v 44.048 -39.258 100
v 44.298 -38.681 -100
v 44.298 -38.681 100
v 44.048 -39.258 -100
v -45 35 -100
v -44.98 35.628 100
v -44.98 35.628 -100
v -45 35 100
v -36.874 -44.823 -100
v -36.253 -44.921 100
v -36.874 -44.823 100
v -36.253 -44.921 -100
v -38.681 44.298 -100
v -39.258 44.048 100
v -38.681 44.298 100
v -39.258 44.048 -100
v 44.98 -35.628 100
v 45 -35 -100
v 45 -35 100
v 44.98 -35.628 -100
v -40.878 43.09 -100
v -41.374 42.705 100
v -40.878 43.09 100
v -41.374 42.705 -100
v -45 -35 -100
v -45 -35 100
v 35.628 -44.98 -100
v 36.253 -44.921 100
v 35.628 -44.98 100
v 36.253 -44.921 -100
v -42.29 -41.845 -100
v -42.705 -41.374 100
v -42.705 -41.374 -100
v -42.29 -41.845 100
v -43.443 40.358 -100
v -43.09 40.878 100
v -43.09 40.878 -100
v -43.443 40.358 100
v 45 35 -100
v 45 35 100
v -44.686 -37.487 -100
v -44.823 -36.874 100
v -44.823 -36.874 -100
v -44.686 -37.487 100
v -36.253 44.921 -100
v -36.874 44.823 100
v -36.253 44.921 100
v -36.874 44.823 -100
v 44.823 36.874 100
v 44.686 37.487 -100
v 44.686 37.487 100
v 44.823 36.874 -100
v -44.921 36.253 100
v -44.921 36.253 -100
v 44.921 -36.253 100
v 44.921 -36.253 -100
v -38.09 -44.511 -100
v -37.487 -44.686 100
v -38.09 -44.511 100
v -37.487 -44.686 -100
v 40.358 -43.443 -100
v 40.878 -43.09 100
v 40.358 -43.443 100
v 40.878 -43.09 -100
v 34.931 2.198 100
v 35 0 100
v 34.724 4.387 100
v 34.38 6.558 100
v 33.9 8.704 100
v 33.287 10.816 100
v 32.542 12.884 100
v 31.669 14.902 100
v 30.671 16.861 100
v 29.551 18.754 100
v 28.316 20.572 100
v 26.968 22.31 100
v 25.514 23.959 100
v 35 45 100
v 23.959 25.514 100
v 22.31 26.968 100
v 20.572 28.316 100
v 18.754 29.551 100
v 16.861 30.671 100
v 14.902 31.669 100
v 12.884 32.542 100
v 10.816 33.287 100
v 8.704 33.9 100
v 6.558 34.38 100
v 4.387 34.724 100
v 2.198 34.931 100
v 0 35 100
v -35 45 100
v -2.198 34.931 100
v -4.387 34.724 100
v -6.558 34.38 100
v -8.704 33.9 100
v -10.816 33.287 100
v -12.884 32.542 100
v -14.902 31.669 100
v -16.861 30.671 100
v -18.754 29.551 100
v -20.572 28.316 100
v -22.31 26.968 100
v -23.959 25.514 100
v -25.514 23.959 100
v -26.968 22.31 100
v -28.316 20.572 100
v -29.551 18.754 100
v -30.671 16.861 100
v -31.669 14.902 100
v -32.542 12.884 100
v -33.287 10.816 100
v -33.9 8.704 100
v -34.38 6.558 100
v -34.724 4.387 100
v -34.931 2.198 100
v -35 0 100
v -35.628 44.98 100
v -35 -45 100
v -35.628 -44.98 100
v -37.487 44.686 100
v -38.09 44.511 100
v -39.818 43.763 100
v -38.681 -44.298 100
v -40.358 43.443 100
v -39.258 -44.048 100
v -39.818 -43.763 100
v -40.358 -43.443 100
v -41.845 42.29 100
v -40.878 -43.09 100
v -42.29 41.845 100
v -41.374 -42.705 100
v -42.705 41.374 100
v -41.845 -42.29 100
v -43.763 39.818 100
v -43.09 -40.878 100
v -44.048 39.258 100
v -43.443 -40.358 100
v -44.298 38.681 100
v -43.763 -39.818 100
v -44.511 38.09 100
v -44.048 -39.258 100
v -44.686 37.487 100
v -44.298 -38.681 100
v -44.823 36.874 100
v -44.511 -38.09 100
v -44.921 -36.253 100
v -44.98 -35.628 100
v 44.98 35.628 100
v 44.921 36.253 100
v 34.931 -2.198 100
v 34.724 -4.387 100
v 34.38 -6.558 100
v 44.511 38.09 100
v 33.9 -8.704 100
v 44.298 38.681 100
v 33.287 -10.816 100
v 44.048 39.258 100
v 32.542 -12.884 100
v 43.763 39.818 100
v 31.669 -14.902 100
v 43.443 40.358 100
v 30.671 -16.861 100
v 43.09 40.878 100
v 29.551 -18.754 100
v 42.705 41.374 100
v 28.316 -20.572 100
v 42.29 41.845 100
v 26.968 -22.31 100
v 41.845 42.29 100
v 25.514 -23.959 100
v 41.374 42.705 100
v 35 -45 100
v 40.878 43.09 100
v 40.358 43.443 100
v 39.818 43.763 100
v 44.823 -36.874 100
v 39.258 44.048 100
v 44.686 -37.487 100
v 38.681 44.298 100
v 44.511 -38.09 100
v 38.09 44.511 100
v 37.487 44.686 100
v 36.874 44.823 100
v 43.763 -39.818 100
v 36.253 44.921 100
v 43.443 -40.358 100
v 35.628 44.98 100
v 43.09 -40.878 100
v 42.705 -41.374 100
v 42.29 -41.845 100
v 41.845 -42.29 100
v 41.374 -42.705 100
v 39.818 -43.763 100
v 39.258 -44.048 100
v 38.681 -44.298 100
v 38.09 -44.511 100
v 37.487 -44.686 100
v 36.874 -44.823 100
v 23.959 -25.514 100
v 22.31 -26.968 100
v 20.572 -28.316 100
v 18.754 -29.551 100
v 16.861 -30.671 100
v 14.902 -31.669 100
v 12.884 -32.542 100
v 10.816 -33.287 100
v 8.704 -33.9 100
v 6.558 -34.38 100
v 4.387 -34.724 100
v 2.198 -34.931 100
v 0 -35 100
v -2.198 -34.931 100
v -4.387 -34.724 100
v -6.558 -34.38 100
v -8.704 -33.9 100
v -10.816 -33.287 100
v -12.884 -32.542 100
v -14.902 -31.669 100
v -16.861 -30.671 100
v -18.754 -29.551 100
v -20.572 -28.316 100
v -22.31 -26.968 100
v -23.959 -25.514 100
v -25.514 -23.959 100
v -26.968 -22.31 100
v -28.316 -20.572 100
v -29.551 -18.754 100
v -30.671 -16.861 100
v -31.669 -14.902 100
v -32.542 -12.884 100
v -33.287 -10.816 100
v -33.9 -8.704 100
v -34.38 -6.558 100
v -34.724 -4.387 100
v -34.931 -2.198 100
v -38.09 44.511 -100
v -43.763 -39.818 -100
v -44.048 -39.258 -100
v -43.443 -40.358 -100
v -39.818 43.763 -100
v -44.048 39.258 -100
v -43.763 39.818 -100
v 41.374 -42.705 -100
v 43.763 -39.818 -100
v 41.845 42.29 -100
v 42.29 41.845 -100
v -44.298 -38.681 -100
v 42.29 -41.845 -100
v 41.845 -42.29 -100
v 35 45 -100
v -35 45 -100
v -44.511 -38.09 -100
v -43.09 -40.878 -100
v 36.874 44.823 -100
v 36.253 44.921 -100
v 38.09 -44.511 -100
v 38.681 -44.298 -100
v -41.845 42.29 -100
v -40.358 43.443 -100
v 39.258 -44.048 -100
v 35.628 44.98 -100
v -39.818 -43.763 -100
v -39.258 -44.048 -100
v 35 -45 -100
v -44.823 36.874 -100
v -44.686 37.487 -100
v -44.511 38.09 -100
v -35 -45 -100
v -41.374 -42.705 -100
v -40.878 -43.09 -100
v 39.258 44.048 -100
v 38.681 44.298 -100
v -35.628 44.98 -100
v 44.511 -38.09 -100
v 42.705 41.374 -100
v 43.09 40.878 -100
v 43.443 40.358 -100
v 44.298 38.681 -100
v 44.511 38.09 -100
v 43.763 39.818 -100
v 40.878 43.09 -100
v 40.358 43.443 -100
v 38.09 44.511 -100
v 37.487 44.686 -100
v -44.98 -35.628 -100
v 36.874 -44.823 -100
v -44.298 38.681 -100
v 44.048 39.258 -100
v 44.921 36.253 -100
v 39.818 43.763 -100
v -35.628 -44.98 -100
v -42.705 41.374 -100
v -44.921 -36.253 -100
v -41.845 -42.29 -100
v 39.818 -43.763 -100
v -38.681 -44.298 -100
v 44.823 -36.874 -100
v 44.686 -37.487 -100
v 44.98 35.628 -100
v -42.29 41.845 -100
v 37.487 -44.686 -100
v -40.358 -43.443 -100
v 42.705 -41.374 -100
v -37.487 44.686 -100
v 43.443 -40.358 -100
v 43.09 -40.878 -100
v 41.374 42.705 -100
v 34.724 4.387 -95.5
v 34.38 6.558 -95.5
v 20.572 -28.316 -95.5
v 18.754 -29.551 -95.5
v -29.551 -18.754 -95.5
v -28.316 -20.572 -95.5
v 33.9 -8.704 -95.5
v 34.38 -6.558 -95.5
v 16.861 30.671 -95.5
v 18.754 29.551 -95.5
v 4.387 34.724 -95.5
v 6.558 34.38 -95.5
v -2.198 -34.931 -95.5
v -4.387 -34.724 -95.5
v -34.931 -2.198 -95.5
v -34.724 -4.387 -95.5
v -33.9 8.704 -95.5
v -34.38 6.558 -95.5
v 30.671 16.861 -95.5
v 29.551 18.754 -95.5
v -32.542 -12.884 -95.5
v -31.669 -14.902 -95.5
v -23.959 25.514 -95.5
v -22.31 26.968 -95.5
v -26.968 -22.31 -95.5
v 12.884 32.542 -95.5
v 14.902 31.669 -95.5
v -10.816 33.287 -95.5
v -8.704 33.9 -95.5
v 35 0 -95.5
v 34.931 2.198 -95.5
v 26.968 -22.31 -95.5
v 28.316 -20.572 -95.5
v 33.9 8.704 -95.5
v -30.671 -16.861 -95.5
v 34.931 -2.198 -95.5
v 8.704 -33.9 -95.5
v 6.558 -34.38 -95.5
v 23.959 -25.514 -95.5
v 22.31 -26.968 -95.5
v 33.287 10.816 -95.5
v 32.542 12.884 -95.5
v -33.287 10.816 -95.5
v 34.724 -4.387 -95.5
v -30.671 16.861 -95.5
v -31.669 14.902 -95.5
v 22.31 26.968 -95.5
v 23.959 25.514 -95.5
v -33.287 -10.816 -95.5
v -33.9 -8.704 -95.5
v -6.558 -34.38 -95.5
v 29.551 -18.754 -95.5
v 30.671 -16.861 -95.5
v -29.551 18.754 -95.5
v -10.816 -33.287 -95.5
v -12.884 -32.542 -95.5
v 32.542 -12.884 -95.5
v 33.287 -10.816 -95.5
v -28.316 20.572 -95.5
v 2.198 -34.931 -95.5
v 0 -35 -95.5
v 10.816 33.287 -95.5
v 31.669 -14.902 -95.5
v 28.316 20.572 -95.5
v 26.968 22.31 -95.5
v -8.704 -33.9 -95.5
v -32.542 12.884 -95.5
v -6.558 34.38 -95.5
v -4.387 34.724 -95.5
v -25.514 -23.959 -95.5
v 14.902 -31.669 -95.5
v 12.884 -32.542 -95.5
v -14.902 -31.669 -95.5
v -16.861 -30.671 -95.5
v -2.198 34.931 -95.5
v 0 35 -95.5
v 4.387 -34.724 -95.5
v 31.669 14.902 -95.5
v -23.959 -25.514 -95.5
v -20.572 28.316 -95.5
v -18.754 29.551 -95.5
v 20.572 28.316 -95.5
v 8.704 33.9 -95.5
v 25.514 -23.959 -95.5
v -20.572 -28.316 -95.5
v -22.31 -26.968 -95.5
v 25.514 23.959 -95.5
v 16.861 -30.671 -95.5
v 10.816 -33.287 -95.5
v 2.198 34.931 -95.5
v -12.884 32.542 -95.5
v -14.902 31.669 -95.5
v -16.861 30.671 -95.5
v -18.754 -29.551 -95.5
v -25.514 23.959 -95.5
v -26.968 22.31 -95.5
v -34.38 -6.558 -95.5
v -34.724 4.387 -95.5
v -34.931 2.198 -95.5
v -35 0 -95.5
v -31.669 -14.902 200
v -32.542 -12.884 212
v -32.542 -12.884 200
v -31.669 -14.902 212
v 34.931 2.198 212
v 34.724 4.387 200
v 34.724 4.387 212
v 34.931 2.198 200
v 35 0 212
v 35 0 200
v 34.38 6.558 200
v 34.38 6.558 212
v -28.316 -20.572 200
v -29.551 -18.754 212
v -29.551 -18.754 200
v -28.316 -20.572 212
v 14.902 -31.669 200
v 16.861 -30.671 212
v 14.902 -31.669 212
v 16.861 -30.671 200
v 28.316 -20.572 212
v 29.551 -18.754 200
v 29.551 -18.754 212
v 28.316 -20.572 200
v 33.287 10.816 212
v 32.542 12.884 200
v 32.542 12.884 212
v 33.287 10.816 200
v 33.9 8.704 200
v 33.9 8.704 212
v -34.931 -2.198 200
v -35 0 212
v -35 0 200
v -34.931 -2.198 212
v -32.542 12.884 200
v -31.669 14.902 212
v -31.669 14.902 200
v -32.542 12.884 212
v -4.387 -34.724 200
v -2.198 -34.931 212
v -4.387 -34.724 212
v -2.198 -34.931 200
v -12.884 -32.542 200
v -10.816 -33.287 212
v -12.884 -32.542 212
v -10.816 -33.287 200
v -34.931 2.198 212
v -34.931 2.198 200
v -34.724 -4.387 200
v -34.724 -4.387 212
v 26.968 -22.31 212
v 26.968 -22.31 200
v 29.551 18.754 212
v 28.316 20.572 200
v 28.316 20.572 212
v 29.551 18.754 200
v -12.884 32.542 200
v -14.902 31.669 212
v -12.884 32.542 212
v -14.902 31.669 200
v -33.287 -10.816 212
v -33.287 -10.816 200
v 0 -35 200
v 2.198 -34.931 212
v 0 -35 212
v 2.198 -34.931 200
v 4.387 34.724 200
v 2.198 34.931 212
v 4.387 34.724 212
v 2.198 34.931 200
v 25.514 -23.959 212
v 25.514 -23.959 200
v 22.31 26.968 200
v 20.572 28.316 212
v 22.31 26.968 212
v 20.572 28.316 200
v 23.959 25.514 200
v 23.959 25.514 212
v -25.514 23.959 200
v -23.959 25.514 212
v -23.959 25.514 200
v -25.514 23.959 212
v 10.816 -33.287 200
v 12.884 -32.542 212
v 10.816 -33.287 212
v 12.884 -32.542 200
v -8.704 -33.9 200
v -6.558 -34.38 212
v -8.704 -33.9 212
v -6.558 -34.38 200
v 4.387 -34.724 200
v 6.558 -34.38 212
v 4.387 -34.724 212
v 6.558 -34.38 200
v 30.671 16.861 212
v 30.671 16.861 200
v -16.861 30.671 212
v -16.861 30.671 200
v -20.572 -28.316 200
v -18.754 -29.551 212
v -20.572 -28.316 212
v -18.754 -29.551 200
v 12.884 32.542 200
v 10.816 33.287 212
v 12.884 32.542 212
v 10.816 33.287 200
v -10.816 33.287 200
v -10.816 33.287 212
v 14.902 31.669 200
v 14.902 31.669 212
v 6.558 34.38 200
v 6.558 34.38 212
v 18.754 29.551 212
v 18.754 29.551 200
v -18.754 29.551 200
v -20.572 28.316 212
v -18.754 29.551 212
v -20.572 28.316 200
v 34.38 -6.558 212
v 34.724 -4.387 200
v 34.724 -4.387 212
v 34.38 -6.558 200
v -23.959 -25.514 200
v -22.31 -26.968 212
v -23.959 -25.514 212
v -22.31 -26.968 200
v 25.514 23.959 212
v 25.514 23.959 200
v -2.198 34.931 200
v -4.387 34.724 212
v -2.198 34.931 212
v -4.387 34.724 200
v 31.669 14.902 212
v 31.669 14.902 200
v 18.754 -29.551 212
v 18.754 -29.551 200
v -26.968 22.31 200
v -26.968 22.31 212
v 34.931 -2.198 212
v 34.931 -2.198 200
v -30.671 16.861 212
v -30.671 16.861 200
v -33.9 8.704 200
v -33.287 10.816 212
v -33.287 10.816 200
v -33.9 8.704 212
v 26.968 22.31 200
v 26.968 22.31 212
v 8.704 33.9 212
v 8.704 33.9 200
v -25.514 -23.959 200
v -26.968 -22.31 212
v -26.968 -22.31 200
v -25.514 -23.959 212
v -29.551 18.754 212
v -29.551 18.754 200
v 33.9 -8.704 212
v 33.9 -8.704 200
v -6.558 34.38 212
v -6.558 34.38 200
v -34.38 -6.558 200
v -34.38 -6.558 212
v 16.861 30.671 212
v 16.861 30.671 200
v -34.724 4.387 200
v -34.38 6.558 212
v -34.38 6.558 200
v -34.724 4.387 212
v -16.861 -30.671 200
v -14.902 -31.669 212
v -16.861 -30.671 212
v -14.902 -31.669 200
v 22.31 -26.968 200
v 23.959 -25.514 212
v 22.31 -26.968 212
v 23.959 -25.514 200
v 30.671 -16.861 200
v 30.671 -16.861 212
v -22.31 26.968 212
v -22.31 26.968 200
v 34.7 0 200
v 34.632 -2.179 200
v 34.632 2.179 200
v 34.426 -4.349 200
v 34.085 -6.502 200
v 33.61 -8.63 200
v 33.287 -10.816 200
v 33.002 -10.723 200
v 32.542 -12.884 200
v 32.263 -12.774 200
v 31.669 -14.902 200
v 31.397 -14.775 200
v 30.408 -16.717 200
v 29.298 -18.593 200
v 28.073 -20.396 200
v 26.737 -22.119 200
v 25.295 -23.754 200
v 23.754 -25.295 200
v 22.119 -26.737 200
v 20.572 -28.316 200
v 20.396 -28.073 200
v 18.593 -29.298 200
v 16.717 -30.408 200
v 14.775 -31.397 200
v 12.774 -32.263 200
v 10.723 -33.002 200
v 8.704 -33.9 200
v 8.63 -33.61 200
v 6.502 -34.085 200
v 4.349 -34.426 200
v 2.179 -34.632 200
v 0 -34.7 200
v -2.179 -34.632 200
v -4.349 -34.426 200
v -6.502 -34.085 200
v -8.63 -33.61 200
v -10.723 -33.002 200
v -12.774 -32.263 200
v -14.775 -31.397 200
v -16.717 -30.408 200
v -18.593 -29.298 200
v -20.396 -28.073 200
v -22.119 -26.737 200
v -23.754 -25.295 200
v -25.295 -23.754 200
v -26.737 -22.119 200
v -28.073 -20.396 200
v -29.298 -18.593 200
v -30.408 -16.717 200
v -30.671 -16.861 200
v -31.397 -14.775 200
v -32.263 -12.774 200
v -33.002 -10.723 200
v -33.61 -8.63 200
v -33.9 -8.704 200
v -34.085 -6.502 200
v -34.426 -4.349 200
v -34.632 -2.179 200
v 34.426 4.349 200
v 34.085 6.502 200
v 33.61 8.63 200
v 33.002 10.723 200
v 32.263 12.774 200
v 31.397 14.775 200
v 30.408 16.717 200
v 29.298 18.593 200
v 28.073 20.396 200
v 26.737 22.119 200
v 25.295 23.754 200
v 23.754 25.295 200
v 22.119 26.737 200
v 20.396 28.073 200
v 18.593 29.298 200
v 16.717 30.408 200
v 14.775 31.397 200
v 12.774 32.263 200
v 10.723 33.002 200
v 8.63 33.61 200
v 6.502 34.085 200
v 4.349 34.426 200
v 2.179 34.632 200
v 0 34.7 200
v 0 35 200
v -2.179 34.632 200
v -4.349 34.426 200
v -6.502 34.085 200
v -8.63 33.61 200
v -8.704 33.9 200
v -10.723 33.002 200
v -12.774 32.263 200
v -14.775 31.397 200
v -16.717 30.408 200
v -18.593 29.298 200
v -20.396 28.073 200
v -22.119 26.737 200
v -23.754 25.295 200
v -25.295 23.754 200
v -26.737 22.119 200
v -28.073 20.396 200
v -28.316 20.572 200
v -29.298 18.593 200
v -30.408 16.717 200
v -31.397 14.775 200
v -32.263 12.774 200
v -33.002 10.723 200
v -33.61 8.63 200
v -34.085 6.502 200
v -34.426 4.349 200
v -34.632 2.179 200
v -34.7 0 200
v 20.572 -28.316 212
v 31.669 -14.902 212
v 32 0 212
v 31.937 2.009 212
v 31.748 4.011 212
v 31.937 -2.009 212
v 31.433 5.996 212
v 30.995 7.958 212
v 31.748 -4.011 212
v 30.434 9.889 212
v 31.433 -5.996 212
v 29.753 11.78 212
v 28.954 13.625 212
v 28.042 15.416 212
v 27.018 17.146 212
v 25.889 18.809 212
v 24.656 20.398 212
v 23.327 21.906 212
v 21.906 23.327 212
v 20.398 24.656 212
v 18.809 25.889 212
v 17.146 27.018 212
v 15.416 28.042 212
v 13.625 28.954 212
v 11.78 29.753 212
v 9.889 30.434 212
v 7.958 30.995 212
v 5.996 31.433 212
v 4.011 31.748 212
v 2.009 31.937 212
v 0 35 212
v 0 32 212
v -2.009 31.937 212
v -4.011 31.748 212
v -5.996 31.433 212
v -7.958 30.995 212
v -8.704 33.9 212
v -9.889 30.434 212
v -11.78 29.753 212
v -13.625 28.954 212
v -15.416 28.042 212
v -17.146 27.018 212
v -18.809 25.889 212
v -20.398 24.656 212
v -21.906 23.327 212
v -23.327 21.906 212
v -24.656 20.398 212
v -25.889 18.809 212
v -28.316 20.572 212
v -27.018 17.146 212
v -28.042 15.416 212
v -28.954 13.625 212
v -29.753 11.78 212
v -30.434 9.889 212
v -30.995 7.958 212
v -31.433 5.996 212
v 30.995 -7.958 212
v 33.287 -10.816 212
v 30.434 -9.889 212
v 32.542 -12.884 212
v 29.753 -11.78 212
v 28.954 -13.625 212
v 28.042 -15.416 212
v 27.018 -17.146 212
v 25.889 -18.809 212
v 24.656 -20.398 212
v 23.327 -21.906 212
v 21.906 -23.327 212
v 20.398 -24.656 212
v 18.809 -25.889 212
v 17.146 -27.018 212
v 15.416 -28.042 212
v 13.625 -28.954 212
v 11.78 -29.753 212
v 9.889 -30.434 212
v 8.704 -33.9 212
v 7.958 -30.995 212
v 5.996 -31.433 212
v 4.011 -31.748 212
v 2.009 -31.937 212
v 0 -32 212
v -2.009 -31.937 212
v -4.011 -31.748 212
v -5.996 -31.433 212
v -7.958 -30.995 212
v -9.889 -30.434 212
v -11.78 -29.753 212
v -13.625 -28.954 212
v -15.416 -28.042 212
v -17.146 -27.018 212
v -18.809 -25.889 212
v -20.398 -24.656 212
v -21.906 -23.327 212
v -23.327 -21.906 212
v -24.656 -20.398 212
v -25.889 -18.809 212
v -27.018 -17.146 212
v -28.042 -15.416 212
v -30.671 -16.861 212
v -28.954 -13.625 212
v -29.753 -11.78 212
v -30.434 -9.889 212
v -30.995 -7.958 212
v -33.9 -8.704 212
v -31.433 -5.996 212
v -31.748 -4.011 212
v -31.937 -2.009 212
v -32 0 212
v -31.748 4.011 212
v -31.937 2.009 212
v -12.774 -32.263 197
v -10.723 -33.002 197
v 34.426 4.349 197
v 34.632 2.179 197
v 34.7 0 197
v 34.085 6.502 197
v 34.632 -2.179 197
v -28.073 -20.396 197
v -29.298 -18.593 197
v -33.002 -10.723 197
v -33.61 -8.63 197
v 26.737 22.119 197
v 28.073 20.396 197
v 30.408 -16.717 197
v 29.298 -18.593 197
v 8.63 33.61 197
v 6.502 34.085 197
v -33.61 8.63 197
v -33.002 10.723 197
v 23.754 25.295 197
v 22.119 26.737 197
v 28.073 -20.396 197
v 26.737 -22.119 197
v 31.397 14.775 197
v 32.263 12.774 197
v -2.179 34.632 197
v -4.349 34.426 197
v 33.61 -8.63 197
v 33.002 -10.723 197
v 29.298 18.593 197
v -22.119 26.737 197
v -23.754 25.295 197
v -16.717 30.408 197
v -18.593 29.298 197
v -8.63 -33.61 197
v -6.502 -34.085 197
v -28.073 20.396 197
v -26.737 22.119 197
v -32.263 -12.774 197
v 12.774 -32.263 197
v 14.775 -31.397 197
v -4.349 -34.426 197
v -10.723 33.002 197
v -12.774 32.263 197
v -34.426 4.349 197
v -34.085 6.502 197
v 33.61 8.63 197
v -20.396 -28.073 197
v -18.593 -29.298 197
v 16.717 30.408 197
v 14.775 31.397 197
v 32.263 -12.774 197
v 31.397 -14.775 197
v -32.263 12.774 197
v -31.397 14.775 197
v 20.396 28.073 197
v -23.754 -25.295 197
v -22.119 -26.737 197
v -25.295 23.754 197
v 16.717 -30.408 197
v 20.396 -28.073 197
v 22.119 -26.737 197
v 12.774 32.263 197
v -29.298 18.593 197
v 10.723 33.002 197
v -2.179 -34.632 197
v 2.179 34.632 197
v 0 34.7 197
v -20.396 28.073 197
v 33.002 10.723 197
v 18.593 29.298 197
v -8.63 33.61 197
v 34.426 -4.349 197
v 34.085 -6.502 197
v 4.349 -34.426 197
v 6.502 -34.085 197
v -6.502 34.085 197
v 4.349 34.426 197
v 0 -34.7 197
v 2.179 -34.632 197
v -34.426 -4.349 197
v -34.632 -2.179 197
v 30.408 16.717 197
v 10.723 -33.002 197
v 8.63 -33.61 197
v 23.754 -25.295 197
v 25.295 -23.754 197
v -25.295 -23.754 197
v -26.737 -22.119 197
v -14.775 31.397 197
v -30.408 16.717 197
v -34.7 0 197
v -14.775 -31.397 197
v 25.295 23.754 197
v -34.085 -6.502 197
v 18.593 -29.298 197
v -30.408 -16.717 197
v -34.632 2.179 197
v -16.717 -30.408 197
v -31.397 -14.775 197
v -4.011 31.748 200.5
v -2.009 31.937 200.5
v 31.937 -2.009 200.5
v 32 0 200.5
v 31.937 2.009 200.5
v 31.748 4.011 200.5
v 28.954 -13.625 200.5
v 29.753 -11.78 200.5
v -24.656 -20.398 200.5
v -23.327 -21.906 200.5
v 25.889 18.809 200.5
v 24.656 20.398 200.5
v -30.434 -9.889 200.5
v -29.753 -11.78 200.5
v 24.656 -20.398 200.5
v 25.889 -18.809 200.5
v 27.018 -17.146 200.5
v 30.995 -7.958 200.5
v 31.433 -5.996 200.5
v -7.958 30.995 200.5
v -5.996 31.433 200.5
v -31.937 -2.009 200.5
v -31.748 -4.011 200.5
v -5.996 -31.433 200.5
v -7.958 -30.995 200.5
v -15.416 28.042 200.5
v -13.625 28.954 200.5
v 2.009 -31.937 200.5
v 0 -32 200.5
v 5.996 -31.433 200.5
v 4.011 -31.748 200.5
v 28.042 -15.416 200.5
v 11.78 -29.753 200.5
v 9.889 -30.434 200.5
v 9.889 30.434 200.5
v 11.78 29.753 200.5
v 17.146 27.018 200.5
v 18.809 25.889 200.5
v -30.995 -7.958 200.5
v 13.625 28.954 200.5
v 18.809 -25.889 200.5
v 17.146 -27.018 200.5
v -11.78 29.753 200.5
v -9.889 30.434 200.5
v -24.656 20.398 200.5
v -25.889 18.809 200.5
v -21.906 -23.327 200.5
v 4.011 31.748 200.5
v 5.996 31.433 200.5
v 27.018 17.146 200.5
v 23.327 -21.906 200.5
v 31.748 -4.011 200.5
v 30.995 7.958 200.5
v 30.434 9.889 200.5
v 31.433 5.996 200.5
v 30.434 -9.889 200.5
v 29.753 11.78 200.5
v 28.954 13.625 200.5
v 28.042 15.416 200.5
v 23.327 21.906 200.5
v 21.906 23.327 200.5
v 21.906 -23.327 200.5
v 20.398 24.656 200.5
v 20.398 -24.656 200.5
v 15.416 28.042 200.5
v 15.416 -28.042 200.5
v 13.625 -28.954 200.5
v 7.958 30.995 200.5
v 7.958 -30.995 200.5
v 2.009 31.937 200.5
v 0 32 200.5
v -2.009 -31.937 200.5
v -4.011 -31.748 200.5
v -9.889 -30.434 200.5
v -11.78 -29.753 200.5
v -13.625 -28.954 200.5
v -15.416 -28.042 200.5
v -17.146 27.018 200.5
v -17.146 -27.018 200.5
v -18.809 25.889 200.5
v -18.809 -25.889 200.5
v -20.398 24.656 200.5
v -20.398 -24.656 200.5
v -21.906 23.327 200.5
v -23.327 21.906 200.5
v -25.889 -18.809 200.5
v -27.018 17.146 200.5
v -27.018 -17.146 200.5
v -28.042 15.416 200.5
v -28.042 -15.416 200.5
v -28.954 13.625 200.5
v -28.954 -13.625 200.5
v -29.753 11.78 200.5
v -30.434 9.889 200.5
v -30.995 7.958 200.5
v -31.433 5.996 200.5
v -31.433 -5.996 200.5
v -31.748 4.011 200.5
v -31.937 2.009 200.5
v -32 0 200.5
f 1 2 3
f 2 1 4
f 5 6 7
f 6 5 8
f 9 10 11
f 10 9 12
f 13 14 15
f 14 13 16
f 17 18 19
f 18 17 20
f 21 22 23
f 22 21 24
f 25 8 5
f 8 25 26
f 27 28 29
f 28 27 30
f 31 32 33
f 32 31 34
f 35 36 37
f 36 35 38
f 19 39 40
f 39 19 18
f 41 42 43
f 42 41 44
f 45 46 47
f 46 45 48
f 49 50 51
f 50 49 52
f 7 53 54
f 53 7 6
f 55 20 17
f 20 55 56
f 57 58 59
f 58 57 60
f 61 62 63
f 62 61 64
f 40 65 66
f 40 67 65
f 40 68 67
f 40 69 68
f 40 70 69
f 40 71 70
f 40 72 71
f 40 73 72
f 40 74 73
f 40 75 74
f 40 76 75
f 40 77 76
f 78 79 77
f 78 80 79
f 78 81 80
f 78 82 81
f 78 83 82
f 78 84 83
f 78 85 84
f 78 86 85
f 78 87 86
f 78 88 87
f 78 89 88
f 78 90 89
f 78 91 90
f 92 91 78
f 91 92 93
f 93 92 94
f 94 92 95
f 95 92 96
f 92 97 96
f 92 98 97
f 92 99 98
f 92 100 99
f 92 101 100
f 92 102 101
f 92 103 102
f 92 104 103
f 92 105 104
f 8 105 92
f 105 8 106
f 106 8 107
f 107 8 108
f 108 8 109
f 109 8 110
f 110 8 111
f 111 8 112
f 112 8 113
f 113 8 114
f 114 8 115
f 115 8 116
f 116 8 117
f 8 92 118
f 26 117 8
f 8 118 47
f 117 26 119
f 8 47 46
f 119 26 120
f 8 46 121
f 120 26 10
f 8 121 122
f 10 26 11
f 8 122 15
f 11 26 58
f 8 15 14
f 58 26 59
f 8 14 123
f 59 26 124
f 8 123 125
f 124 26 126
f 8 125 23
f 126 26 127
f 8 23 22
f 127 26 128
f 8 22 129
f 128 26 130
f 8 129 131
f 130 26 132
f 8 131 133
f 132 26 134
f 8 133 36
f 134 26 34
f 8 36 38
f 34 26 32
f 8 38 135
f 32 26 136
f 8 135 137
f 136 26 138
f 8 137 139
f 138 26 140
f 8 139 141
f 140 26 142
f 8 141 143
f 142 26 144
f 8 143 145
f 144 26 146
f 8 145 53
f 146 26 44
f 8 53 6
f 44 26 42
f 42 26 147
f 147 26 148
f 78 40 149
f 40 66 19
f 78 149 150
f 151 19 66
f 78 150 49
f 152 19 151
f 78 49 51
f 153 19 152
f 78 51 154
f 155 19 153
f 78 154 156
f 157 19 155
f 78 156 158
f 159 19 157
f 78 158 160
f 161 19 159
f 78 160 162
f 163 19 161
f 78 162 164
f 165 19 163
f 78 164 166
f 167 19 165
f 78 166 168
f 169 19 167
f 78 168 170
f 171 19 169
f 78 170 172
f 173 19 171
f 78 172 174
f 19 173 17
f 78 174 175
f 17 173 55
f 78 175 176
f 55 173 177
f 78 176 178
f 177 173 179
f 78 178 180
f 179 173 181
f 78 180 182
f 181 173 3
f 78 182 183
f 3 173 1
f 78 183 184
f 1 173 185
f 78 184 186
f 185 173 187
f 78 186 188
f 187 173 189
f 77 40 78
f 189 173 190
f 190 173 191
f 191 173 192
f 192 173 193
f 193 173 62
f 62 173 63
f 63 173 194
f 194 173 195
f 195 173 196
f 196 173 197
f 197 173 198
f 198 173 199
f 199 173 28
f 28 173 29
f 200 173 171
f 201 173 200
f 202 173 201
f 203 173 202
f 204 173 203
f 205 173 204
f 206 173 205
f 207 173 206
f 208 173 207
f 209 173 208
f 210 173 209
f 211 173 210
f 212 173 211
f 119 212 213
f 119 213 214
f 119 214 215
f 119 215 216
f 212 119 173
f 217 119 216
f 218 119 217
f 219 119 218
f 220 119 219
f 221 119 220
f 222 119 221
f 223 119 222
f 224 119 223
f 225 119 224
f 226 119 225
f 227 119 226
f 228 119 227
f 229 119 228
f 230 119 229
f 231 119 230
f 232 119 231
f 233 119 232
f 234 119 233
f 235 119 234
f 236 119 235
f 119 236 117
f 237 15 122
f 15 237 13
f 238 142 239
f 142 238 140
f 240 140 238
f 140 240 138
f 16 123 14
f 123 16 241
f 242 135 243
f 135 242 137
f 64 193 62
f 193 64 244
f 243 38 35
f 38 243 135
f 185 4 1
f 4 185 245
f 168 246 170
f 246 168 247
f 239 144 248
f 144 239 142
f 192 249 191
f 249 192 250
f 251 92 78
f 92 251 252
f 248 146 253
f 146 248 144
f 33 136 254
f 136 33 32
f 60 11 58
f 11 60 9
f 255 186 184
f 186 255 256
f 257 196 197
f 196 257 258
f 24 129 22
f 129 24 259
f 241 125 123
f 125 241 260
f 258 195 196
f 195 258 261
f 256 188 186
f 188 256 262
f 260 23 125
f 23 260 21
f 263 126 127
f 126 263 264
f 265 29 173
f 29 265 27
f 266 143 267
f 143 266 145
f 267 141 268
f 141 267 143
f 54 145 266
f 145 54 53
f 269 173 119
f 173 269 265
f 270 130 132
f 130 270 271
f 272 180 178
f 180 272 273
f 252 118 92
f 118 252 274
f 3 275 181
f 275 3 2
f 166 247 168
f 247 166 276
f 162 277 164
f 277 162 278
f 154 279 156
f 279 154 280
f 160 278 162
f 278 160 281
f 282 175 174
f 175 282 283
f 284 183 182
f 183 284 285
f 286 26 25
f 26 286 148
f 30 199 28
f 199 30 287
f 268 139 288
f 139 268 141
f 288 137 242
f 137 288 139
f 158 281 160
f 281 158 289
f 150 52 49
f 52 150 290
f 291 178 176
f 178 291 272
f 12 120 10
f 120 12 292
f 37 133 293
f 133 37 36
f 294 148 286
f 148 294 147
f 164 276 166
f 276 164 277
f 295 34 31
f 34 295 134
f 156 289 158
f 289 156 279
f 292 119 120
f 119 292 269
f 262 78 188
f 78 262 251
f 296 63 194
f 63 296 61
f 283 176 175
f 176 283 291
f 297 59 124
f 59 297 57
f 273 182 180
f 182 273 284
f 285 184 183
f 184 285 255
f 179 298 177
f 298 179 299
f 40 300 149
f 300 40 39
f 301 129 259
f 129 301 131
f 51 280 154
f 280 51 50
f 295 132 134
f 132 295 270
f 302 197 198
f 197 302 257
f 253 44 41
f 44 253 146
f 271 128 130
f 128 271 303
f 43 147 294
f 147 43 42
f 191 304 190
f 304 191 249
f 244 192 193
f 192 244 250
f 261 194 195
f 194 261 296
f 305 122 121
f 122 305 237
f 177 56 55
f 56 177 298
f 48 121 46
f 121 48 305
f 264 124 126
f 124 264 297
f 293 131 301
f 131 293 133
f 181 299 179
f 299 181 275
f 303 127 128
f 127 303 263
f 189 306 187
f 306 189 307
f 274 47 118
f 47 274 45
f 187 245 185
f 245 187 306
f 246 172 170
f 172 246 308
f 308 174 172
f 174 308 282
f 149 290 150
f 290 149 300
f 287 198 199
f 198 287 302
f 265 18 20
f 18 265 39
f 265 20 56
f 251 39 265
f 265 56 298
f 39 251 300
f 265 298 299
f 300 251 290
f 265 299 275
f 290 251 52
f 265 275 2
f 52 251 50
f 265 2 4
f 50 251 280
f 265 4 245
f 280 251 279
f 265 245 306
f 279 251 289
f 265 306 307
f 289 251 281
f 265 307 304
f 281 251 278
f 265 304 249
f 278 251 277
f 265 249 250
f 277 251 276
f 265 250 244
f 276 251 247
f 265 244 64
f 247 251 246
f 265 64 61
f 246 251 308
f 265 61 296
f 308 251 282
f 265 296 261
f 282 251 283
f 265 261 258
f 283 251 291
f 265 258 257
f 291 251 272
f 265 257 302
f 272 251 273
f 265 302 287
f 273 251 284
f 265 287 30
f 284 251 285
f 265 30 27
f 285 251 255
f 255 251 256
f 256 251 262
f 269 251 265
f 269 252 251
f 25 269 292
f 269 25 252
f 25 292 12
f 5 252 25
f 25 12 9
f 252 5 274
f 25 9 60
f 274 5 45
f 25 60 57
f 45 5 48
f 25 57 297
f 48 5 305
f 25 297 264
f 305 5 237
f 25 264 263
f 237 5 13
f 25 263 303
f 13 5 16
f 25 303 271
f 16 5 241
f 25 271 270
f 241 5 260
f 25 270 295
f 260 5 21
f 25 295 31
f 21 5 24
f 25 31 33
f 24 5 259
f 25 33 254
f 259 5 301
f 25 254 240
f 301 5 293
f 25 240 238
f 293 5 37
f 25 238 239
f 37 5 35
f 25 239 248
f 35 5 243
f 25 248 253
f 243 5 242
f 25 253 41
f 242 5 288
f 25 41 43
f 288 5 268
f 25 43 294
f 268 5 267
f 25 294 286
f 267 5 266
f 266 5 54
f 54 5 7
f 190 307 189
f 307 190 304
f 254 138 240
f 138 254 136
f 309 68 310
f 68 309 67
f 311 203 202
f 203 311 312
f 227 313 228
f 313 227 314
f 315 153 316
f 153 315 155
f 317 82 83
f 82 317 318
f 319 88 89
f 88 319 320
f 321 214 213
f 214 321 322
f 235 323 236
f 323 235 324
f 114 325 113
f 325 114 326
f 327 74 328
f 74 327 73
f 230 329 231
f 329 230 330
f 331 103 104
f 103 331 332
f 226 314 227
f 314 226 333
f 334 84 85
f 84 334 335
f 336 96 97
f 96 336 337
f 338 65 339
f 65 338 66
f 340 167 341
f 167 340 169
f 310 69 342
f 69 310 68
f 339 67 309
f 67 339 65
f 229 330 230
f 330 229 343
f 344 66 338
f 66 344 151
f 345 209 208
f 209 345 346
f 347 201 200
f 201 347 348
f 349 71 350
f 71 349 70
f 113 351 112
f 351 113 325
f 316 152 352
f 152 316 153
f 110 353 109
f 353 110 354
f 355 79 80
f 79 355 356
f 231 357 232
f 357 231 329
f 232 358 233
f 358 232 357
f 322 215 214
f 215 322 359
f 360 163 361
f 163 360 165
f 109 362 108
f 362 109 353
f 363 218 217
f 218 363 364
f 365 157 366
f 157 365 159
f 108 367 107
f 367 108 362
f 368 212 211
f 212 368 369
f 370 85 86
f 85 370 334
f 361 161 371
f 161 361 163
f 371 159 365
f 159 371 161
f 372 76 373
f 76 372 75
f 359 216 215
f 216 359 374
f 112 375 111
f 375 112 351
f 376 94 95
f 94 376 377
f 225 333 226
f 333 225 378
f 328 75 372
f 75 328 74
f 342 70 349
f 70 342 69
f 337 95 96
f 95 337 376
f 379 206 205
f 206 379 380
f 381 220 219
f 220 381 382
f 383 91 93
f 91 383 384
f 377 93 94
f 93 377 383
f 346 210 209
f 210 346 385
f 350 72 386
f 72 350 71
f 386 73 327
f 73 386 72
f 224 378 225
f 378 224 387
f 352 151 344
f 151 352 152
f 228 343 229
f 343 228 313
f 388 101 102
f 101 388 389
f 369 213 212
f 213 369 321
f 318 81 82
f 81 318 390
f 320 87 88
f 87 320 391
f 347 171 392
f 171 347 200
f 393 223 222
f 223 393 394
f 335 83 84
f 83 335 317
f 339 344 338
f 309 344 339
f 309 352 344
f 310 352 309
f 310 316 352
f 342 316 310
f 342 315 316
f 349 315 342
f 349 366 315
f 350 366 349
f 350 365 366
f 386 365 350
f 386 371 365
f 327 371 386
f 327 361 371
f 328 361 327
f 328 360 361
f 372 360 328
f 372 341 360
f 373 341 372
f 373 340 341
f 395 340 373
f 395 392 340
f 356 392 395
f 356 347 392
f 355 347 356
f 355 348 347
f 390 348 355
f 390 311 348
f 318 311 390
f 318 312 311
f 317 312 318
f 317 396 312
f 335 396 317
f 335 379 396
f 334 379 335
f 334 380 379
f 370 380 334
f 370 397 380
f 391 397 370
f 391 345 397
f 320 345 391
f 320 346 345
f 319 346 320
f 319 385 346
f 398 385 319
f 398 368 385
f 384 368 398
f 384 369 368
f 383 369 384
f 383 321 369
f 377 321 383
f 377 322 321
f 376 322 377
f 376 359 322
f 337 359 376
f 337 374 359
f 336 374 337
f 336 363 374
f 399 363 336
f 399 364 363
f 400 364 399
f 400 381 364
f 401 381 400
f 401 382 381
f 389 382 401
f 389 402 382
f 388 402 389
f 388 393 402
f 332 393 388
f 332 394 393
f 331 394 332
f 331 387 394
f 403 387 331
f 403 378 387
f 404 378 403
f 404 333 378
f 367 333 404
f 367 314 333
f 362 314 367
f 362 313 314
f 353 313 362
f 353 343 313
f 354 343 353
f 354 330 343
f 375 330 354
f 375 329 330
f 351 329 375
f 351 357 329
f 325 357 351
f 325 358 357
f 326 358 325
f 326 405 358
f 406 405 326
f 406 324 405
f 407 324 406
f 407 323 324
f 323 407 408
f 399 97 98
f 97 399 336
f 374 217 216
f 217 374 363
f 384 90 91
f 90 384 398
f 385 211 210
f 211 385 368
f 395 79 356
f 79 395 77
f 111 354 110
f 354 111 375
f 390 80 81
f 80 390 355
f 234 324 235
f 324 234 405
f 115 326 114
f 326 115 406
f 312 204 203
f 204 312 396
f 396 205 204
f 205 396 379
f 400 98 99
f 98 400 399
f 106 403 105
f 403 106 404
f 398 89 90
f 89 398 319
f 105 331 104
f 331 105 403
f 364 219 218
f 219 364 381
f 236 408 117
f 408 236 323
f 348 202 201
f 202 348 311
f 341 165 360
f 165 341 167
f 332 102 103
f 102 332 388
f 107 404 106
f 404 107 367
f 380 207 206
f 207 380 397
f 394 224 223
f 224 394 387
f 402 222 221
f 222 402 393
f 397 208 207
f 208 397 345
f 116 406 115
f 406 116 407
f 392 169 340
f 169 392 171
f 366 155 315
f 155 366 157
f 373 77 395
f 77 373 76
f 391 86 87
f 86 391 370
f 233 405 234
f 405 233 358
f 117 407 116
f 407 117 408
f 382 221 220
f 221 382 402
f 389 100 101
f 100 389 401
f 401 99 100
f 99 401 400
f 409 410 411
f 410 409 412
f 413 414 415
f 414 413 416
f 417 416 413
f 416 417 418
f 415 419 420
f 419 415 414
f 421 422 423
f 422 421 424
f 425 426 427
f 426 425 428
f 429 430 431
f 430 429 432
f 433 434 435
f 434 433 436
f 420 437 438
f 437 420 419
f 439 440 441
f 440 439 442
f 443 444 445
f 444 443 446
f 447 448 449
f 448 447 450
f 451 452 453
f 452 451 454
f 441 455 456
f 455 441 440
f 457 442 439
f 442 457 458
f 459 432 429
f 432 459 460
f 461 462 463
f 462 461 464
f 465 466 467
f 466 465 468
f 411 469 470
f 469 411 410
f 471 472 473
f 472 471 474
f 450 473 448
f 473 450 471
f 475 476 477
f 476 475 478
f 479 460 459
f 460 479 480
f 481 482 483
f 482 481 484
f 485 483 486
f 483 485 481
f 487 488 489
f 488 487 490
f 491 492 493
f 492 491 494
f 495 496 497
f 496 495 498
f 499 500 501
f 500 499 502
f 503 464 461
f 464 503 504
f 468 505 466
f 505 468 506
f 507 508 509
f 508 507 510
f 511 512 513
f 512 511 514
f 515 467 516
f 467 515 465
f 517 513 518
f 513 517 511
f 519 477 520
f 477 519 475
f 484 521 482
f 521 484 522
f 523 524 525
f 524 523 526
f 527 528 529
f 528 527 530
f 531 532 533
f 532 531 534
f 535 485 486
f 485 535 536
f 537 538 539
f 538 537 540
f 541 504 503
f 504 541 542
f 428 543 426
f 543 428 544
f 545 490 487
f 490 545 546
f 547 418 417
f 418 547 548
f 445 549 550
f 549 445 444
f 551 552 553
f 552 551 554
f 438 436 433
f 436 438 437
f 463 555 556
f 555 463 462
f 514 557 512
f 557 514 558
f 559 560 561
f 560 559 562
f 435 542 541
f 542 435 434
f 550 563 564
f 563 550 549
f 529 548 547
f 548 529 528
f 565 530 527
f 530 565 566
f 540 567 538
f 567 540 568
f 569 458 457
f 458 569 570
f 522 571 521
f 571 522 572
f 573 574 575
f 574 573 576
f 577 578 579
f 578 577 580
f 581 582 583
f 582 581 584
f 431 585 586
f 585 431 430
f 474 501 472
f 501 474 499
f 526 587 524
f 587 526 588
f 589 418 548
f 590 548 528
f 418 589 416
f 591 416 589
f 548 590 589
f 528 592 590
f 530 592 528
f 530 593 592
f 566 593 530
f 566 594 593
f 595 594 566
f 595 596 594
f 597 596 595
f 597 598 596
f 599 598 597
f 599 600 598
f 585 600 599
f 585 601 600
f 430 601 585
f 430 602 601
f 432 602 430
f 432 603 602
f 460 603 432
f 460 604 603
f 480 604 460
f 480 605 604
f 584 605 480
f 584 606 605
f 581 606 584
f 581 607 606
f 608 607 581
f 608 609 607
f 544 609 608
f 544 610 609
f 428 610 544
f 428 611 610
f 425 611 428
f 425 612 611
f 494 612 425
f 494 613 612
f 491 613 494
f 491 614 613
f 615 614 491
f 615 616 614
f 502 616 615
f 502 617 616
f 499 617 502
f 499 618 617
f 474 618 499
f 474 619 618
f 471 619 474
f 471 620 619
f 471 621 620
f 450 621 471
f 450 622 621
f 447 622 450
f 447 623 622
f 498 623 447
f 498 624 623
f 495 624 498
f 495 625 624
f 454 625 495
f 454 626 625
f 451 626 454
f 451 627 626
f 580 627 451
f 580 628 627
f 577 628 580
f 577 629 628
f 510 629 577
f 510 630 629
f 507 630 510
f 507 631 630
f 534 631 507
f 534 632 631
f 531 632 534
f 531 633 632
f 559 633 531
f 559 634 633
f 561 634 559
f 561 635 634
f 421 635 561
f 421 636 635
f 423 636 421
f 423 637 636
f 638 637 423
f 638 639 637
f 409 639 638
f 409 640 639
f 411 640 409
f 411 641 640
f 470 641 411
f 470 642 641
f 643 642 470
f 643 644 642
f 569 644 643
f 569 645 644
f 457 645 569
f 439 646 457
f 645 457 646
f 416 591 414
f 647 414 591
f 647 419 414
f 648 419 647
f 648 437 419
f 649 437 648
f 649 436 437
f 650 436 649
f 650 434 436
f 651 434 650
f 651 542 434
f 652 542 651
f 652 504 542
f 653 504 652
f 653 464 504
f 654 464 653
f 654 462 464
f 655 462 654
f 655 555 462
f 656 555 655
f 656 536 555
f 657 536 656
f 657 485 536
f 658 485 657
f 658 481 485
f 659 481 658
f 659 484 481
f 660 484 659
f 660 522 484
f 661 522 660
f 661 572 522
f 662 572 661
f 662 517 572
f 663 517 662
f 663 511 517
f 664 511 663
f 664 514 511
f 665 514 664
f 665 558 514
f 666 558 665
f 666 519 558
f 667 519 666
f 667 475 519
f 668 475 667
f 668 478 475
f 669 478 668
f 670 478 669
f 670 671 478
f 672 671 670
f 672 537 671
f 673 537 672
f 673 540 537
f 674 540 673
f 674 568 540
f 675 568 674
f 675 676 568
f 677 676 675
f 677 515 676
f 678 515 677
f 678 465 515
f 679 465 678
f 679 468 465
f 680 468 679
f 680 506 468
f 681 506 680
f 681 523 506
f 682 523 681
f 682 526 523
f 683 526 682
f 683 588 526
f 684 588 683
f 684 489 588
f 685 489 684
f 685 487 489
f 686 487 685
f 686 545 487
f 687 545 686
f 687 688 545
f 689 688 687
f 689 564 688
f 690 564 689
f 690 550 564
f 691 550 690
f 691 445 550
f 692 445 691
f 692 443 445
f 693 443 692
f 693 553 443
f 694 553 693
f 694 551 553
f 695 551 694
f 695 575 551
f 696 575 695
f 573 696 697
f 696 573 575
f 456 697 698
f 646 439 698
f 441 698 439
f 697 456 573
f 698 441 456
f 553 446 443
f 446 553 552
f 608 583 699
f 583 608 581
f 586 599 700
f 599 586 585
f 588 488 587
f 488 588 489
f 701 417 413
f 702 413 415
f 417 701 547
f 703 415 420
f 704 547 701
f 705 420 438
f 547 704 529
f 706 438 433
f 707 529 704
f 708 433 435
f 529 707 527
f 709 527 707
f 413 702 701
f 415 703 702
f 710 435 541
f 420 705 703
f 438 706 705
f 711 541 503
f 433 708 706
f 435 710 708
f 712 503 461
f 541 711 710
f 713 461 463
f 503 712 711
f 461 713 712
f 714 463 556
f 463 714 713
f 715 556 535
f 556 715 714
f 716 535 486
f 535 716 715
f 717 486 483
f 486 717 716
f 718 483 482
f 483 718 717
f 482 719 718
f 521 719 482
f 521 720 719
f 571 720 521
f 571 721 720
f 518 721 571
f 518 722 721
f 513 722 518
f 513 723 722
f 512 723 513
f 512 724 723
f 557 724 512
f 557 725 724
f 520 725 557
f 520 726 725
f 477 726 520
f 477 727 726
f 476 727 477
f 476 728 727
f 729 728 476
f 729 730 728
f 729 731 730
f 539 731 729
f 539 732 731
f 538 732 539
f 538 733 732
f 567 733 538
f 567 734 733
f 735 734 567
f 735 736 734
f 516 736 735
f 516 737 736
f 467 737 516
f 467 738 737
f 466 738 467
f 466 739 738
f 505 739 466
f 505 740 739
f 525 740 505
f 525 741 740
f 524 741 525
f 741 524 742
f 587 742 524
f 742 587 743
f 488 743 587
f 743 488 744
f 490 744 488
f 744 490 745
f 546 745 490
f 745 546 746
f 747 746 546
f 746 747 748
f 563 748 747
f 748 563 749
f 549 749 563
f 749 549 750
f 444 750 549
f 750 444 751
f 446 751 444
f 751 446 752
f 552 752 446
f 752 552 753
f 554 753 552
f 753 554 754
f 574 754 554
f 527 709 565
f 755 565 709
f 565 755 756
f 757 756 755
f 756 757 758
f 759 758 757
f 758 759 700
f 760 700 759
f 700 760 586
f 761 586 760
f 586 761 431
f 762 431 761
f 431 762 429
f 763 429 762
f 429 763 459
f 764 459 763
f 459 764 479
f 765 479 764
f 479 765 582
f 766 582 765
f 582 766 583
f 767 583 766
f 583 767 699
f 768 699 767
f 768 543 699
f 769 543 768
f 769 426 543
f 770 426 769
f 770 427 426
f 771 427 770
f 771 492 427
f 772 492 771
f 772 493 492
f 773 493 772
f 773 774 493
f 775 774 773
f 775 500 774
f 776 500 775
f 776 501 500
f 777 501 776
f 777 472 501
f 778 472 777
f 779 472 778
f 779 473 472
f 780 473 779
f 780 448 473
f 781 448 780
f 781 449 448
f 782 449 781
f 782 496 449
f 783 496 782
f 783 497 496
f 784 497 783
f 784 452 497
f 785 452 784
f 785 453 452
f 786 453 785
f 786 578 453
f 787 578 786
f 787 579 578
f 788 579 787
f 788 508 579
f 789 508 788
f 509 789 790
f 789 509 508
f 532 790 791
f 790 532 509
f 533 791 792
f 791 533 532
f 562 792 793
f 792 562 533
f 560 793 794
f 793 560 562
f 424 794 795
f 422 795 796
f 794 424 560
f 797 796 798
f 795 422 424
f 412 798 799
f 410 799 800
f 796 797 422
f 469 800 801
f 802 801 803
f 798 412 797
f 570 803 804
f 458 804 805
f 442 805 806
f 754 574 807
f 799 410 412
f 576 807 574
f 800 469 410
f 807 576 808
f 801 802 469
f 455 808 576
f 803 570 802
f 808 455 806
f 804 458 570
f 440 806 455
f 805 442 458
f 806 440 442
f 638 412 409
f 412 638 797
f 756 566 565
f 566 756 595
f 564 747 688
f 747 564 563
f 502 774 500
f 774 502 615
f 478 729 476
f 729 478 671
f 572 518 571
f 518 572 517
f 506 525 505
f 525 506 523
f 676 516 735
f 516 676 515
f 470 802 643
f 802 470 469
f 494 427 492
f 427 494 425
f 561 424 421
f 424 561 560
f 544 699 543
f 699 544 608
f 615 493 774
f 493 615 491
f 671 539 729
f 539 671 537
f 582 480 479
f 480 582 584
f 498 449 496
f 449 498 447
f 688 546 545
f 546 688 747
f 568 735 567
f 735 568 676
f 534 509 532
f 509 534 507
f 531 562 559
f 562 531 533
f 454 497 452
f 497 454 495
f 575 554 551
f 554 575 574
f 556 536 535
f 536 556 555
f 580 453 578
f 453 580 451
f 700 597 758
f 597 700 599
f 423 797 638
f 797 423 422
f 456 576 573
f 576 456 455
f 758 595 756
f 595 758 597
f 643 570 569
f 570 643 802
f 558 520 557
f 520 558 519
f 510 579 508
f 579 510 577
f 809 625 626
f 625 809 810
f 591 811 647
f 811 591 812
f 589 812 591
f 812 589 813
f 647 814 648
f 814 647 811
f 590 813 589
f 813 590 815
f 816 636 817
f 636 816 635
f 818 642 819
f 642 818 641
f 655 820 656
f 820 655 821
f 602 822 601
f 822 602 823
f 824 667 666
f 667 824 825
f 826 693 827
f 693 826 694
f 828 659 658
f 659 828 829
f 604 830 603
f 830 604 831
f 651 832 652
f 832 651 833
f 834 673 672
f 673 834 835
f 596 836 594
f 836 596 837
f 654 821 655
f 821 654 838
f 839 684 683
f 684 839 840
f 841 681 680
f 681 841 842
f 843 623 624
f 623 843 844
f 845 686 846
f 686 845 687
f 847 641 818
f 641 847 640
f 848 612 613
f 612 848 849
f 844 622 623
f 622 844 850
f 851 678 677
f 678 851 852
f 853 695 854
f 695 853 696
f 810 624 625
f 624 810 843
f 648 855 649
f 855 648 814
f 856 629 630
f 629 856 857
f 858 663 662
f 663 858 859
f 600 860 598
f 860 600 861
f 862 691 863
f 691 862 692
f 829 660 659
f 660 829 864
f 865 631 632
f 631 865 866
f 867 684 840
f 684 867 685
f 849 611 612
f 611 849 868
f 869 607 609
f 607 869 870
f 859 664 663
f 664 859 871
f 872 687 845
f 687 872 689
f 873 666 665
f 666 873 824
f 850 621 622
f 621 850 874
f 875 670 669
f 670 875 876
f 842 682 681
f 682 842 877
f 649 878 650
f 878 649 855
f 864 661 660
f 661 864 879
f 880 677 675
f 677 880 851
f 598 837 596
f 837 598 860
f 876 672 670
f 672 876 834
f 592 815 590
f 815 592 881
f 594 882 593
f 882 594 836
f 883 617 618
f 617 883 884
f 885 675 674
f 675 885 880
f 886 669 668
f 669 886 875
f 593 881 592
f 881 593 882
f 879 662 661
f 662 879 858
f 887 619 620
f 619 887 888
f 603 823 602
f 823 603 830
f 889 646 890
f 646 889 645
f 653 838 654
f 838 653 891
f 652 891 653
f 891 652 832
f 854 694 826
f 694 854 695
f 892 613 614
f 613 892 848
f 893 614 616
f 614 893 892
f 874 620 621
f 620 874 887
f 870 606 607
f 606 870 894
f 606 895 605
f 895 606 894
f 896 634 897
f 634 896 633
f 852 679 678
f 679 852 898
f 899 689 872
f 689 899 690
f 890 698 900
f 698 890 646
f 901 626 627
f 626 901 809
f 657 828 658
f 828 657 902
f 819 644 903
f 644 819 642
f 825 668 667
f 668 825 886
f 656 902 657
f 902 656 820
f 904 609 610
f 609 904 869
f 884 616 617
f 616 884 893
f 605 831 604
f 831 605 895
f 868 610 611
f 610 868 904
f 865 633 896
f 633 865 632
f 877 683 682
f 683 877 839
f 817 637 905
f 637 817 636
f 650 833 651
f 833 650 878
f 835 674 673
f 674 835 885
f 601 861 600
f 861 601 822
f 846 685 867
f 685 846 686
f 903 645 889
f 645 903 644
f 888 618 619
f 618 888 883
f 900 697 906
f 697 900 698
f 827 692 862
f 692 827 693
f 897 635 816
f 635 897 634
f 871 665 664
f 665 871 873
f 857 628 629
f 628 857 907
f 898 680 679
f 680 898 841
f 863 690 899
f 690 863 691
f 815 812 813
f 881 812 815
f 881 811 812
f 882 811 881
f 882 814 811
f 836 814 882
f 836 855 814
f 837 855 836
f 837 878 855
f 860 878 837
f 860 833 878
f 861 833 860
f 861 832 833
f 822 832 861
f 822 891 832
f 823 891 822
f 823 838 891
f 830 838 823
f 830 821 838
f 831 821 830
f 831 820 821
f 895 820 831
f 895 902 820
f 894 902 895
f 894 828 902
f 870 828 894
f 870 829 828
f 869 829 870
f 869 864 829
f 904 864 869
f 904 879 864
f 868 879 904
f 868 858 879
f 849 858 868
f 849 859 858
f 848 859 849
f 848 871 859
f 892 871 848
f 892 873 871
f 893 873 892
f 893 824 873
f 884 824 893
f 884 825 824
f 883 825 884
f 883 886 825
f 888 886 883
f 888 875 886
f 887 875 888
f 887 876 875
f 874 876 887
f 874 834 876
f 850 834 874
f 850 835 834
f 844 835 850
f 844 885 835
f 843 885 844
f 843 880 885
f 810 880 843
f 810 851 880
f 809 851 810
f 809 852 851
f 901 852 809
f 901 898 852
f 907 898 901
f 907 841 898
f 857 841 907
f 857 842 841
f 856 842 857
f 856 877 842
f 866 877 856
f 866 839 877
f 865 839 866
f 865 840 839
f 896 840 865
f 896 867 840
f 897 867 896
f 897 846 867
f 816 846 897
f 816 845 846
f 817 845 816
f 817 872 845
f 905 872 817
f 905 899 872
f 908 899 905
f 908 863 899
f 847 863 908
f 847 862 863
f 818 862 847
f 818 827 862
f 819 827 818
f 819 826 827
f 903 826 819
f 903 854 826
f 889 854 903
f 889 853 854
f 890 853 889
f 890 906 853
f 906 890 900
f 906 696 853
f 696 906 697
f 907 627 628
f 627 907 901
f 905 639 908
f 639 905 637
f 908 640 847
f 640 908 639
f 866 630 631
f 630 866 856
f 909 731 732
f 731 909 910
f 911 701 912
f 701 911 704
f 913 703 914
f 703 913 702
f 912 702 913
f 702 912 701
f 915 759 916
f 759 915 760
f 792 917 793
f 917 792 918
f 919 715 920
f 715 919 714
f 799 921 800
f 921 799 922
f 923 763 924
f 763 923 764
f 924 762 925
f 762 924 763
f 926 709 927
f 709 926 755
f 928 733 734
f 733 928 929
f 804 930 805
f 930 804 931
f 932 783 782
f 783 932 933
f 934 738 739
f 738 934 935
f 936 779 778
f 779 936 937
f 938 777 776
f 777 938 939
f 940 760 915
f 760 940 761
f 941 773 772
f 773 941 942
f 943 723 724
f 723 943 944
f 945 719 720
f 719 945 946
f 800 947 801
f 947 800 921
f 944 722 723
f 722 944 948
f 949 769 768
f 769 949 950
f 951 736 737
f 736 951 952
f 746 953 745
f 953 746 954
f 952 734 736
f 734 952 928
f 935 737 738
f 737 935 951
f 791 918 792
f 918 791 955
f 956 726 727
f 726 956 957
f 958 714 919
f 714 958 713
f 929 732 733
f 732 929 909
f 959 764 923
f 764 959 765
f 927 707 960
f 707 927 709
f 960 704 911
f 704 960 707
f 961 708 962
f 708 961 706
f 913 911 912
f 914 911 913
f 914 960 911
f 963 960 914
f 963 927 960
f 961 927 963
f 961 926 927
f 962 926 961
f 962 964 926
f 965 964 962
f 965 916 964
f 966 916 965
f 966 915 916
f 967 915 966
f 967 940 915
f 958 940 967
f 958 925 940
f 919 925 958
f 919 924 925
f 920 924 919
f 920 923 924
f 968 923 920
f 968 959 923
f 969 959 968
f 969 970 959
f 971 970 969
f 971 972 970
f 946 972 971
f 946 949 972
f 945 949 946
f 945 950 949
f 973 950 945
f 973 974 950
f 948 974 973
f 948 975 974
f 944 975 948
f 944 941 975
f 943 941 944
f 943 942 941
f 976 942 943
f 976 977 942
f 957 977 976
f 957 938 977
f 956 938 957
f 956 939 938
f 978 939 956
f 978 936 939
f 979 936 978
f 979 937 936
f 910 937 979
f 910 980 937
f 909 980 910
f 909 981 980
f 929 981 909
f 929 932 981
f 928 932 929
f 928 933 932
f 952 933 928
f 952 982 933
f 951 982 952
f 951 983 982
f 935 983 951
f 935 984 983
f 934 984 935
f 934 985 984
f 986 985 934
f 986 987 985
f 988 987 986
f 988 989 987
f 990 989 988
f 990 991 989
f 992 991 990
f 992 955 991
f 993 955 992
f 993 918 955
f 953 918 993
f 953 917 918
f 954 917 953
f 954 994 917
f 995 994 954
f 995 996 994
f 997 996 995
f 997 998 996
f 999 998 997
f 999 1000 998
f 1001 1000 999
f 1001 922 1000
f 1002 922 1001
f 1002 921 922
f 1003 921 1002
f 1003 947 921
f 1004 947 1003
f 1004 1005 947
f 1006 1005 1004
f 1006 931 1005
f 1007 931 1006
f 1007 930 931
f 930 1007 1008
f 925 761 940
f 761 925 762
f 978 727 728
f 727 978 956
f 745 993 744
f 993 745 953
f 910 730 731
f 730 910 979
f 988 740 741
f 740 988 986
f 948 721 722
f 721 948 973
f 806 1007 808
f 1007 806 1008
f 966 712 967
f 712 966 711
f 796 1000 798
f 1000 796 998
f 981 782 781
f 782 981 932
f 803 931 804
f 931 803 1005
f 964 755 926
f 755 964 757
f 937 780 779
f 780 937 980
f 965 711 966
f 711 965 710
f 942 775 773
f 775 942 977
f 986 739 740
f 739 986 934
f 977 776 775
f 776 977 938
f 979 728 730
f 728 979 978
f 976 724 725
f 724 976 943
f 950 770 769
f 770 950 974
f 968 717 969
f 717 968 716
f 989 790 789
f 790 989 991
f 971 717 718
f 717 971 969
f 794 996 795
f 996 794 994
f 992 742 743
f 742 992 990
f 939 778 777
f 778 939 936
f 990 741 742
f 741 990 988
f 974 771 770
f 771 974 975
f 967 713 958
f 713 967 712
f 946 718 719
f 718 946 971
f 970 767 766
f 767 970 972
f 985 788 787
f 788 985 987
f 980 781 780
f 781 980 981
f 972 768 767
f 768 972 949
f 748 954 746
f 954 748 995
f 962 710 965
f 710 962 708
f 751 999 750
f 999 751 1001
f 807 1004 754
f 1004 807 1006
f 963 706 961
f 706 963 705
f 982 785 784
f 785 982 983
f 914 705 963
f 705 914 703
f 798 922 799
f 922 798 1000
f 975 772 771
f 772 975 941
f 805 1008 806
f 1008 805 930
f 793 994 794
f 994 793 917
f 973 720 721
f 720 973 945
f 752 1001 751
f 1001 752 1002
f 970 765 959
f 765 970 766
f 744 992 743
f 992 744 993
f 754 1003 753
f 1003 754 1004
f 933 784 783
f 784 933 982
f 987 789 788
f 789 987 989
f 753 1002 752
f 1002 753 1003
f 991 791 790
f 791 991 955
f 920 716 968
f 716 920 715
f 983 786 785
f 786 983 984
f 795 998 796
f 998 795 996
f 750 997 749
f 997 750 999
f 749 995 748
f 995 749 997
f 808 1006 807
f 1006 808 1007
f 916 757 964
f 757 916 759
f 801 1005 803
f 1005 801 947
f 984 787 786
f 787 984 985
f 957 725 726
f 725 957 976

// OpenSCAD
// Parámetros
size_x = 90;
size_y = 90;
size_z = 200;
corner_radius = 10;
wall_thickness = 3;

diam_tapa = 70;
altura_tapa = 12;
ajuste_tapa = 0.3;
$fn = 100;

// --------------------
// Módulo para forma exterior rectangular redondeada
module rounded_box(x, y, z, r) {
    minkowski() {
        cube([x - 2*r, y - 2*r, z - r], center = true);
        cylinder(h = r, r = r, center = true);
    }
}

// --------------------
// Cuerpo del envase
color([0.349, 0.788, 0.647])
difference() {
    // Exterior rectangular
    rounded_box(size_x, size_y, size_z, corner_radius);

    // Hueco cilíndrico centrado
    translate([0, 0, wall_thickness])
        cylinder(h = size_z - wall_thickness, r = diam_tapa/2, center = true);
}

// --------------------
// Tapa circular desplazada
color([0.2, 0.6, 0.8])
translate([0, 0, size_z])
difference() {
    union() {
        // Disco superior
        cylinder(h = altura_tapa, r = diam_tapa/2);

        // Reborde que encaja en el hueco
        translate([0, 0, -3])
            cylinder(h = 3, r = (diam_tapa/2 - ajuste_tapa));
    }

    // Aligerar la parte interna de la tapa
    translate([0, 0, 0.5])
        cylinder(h = altura_tapa - 0.5, r = (diam_tapa/2 - wall_thickness));
}
